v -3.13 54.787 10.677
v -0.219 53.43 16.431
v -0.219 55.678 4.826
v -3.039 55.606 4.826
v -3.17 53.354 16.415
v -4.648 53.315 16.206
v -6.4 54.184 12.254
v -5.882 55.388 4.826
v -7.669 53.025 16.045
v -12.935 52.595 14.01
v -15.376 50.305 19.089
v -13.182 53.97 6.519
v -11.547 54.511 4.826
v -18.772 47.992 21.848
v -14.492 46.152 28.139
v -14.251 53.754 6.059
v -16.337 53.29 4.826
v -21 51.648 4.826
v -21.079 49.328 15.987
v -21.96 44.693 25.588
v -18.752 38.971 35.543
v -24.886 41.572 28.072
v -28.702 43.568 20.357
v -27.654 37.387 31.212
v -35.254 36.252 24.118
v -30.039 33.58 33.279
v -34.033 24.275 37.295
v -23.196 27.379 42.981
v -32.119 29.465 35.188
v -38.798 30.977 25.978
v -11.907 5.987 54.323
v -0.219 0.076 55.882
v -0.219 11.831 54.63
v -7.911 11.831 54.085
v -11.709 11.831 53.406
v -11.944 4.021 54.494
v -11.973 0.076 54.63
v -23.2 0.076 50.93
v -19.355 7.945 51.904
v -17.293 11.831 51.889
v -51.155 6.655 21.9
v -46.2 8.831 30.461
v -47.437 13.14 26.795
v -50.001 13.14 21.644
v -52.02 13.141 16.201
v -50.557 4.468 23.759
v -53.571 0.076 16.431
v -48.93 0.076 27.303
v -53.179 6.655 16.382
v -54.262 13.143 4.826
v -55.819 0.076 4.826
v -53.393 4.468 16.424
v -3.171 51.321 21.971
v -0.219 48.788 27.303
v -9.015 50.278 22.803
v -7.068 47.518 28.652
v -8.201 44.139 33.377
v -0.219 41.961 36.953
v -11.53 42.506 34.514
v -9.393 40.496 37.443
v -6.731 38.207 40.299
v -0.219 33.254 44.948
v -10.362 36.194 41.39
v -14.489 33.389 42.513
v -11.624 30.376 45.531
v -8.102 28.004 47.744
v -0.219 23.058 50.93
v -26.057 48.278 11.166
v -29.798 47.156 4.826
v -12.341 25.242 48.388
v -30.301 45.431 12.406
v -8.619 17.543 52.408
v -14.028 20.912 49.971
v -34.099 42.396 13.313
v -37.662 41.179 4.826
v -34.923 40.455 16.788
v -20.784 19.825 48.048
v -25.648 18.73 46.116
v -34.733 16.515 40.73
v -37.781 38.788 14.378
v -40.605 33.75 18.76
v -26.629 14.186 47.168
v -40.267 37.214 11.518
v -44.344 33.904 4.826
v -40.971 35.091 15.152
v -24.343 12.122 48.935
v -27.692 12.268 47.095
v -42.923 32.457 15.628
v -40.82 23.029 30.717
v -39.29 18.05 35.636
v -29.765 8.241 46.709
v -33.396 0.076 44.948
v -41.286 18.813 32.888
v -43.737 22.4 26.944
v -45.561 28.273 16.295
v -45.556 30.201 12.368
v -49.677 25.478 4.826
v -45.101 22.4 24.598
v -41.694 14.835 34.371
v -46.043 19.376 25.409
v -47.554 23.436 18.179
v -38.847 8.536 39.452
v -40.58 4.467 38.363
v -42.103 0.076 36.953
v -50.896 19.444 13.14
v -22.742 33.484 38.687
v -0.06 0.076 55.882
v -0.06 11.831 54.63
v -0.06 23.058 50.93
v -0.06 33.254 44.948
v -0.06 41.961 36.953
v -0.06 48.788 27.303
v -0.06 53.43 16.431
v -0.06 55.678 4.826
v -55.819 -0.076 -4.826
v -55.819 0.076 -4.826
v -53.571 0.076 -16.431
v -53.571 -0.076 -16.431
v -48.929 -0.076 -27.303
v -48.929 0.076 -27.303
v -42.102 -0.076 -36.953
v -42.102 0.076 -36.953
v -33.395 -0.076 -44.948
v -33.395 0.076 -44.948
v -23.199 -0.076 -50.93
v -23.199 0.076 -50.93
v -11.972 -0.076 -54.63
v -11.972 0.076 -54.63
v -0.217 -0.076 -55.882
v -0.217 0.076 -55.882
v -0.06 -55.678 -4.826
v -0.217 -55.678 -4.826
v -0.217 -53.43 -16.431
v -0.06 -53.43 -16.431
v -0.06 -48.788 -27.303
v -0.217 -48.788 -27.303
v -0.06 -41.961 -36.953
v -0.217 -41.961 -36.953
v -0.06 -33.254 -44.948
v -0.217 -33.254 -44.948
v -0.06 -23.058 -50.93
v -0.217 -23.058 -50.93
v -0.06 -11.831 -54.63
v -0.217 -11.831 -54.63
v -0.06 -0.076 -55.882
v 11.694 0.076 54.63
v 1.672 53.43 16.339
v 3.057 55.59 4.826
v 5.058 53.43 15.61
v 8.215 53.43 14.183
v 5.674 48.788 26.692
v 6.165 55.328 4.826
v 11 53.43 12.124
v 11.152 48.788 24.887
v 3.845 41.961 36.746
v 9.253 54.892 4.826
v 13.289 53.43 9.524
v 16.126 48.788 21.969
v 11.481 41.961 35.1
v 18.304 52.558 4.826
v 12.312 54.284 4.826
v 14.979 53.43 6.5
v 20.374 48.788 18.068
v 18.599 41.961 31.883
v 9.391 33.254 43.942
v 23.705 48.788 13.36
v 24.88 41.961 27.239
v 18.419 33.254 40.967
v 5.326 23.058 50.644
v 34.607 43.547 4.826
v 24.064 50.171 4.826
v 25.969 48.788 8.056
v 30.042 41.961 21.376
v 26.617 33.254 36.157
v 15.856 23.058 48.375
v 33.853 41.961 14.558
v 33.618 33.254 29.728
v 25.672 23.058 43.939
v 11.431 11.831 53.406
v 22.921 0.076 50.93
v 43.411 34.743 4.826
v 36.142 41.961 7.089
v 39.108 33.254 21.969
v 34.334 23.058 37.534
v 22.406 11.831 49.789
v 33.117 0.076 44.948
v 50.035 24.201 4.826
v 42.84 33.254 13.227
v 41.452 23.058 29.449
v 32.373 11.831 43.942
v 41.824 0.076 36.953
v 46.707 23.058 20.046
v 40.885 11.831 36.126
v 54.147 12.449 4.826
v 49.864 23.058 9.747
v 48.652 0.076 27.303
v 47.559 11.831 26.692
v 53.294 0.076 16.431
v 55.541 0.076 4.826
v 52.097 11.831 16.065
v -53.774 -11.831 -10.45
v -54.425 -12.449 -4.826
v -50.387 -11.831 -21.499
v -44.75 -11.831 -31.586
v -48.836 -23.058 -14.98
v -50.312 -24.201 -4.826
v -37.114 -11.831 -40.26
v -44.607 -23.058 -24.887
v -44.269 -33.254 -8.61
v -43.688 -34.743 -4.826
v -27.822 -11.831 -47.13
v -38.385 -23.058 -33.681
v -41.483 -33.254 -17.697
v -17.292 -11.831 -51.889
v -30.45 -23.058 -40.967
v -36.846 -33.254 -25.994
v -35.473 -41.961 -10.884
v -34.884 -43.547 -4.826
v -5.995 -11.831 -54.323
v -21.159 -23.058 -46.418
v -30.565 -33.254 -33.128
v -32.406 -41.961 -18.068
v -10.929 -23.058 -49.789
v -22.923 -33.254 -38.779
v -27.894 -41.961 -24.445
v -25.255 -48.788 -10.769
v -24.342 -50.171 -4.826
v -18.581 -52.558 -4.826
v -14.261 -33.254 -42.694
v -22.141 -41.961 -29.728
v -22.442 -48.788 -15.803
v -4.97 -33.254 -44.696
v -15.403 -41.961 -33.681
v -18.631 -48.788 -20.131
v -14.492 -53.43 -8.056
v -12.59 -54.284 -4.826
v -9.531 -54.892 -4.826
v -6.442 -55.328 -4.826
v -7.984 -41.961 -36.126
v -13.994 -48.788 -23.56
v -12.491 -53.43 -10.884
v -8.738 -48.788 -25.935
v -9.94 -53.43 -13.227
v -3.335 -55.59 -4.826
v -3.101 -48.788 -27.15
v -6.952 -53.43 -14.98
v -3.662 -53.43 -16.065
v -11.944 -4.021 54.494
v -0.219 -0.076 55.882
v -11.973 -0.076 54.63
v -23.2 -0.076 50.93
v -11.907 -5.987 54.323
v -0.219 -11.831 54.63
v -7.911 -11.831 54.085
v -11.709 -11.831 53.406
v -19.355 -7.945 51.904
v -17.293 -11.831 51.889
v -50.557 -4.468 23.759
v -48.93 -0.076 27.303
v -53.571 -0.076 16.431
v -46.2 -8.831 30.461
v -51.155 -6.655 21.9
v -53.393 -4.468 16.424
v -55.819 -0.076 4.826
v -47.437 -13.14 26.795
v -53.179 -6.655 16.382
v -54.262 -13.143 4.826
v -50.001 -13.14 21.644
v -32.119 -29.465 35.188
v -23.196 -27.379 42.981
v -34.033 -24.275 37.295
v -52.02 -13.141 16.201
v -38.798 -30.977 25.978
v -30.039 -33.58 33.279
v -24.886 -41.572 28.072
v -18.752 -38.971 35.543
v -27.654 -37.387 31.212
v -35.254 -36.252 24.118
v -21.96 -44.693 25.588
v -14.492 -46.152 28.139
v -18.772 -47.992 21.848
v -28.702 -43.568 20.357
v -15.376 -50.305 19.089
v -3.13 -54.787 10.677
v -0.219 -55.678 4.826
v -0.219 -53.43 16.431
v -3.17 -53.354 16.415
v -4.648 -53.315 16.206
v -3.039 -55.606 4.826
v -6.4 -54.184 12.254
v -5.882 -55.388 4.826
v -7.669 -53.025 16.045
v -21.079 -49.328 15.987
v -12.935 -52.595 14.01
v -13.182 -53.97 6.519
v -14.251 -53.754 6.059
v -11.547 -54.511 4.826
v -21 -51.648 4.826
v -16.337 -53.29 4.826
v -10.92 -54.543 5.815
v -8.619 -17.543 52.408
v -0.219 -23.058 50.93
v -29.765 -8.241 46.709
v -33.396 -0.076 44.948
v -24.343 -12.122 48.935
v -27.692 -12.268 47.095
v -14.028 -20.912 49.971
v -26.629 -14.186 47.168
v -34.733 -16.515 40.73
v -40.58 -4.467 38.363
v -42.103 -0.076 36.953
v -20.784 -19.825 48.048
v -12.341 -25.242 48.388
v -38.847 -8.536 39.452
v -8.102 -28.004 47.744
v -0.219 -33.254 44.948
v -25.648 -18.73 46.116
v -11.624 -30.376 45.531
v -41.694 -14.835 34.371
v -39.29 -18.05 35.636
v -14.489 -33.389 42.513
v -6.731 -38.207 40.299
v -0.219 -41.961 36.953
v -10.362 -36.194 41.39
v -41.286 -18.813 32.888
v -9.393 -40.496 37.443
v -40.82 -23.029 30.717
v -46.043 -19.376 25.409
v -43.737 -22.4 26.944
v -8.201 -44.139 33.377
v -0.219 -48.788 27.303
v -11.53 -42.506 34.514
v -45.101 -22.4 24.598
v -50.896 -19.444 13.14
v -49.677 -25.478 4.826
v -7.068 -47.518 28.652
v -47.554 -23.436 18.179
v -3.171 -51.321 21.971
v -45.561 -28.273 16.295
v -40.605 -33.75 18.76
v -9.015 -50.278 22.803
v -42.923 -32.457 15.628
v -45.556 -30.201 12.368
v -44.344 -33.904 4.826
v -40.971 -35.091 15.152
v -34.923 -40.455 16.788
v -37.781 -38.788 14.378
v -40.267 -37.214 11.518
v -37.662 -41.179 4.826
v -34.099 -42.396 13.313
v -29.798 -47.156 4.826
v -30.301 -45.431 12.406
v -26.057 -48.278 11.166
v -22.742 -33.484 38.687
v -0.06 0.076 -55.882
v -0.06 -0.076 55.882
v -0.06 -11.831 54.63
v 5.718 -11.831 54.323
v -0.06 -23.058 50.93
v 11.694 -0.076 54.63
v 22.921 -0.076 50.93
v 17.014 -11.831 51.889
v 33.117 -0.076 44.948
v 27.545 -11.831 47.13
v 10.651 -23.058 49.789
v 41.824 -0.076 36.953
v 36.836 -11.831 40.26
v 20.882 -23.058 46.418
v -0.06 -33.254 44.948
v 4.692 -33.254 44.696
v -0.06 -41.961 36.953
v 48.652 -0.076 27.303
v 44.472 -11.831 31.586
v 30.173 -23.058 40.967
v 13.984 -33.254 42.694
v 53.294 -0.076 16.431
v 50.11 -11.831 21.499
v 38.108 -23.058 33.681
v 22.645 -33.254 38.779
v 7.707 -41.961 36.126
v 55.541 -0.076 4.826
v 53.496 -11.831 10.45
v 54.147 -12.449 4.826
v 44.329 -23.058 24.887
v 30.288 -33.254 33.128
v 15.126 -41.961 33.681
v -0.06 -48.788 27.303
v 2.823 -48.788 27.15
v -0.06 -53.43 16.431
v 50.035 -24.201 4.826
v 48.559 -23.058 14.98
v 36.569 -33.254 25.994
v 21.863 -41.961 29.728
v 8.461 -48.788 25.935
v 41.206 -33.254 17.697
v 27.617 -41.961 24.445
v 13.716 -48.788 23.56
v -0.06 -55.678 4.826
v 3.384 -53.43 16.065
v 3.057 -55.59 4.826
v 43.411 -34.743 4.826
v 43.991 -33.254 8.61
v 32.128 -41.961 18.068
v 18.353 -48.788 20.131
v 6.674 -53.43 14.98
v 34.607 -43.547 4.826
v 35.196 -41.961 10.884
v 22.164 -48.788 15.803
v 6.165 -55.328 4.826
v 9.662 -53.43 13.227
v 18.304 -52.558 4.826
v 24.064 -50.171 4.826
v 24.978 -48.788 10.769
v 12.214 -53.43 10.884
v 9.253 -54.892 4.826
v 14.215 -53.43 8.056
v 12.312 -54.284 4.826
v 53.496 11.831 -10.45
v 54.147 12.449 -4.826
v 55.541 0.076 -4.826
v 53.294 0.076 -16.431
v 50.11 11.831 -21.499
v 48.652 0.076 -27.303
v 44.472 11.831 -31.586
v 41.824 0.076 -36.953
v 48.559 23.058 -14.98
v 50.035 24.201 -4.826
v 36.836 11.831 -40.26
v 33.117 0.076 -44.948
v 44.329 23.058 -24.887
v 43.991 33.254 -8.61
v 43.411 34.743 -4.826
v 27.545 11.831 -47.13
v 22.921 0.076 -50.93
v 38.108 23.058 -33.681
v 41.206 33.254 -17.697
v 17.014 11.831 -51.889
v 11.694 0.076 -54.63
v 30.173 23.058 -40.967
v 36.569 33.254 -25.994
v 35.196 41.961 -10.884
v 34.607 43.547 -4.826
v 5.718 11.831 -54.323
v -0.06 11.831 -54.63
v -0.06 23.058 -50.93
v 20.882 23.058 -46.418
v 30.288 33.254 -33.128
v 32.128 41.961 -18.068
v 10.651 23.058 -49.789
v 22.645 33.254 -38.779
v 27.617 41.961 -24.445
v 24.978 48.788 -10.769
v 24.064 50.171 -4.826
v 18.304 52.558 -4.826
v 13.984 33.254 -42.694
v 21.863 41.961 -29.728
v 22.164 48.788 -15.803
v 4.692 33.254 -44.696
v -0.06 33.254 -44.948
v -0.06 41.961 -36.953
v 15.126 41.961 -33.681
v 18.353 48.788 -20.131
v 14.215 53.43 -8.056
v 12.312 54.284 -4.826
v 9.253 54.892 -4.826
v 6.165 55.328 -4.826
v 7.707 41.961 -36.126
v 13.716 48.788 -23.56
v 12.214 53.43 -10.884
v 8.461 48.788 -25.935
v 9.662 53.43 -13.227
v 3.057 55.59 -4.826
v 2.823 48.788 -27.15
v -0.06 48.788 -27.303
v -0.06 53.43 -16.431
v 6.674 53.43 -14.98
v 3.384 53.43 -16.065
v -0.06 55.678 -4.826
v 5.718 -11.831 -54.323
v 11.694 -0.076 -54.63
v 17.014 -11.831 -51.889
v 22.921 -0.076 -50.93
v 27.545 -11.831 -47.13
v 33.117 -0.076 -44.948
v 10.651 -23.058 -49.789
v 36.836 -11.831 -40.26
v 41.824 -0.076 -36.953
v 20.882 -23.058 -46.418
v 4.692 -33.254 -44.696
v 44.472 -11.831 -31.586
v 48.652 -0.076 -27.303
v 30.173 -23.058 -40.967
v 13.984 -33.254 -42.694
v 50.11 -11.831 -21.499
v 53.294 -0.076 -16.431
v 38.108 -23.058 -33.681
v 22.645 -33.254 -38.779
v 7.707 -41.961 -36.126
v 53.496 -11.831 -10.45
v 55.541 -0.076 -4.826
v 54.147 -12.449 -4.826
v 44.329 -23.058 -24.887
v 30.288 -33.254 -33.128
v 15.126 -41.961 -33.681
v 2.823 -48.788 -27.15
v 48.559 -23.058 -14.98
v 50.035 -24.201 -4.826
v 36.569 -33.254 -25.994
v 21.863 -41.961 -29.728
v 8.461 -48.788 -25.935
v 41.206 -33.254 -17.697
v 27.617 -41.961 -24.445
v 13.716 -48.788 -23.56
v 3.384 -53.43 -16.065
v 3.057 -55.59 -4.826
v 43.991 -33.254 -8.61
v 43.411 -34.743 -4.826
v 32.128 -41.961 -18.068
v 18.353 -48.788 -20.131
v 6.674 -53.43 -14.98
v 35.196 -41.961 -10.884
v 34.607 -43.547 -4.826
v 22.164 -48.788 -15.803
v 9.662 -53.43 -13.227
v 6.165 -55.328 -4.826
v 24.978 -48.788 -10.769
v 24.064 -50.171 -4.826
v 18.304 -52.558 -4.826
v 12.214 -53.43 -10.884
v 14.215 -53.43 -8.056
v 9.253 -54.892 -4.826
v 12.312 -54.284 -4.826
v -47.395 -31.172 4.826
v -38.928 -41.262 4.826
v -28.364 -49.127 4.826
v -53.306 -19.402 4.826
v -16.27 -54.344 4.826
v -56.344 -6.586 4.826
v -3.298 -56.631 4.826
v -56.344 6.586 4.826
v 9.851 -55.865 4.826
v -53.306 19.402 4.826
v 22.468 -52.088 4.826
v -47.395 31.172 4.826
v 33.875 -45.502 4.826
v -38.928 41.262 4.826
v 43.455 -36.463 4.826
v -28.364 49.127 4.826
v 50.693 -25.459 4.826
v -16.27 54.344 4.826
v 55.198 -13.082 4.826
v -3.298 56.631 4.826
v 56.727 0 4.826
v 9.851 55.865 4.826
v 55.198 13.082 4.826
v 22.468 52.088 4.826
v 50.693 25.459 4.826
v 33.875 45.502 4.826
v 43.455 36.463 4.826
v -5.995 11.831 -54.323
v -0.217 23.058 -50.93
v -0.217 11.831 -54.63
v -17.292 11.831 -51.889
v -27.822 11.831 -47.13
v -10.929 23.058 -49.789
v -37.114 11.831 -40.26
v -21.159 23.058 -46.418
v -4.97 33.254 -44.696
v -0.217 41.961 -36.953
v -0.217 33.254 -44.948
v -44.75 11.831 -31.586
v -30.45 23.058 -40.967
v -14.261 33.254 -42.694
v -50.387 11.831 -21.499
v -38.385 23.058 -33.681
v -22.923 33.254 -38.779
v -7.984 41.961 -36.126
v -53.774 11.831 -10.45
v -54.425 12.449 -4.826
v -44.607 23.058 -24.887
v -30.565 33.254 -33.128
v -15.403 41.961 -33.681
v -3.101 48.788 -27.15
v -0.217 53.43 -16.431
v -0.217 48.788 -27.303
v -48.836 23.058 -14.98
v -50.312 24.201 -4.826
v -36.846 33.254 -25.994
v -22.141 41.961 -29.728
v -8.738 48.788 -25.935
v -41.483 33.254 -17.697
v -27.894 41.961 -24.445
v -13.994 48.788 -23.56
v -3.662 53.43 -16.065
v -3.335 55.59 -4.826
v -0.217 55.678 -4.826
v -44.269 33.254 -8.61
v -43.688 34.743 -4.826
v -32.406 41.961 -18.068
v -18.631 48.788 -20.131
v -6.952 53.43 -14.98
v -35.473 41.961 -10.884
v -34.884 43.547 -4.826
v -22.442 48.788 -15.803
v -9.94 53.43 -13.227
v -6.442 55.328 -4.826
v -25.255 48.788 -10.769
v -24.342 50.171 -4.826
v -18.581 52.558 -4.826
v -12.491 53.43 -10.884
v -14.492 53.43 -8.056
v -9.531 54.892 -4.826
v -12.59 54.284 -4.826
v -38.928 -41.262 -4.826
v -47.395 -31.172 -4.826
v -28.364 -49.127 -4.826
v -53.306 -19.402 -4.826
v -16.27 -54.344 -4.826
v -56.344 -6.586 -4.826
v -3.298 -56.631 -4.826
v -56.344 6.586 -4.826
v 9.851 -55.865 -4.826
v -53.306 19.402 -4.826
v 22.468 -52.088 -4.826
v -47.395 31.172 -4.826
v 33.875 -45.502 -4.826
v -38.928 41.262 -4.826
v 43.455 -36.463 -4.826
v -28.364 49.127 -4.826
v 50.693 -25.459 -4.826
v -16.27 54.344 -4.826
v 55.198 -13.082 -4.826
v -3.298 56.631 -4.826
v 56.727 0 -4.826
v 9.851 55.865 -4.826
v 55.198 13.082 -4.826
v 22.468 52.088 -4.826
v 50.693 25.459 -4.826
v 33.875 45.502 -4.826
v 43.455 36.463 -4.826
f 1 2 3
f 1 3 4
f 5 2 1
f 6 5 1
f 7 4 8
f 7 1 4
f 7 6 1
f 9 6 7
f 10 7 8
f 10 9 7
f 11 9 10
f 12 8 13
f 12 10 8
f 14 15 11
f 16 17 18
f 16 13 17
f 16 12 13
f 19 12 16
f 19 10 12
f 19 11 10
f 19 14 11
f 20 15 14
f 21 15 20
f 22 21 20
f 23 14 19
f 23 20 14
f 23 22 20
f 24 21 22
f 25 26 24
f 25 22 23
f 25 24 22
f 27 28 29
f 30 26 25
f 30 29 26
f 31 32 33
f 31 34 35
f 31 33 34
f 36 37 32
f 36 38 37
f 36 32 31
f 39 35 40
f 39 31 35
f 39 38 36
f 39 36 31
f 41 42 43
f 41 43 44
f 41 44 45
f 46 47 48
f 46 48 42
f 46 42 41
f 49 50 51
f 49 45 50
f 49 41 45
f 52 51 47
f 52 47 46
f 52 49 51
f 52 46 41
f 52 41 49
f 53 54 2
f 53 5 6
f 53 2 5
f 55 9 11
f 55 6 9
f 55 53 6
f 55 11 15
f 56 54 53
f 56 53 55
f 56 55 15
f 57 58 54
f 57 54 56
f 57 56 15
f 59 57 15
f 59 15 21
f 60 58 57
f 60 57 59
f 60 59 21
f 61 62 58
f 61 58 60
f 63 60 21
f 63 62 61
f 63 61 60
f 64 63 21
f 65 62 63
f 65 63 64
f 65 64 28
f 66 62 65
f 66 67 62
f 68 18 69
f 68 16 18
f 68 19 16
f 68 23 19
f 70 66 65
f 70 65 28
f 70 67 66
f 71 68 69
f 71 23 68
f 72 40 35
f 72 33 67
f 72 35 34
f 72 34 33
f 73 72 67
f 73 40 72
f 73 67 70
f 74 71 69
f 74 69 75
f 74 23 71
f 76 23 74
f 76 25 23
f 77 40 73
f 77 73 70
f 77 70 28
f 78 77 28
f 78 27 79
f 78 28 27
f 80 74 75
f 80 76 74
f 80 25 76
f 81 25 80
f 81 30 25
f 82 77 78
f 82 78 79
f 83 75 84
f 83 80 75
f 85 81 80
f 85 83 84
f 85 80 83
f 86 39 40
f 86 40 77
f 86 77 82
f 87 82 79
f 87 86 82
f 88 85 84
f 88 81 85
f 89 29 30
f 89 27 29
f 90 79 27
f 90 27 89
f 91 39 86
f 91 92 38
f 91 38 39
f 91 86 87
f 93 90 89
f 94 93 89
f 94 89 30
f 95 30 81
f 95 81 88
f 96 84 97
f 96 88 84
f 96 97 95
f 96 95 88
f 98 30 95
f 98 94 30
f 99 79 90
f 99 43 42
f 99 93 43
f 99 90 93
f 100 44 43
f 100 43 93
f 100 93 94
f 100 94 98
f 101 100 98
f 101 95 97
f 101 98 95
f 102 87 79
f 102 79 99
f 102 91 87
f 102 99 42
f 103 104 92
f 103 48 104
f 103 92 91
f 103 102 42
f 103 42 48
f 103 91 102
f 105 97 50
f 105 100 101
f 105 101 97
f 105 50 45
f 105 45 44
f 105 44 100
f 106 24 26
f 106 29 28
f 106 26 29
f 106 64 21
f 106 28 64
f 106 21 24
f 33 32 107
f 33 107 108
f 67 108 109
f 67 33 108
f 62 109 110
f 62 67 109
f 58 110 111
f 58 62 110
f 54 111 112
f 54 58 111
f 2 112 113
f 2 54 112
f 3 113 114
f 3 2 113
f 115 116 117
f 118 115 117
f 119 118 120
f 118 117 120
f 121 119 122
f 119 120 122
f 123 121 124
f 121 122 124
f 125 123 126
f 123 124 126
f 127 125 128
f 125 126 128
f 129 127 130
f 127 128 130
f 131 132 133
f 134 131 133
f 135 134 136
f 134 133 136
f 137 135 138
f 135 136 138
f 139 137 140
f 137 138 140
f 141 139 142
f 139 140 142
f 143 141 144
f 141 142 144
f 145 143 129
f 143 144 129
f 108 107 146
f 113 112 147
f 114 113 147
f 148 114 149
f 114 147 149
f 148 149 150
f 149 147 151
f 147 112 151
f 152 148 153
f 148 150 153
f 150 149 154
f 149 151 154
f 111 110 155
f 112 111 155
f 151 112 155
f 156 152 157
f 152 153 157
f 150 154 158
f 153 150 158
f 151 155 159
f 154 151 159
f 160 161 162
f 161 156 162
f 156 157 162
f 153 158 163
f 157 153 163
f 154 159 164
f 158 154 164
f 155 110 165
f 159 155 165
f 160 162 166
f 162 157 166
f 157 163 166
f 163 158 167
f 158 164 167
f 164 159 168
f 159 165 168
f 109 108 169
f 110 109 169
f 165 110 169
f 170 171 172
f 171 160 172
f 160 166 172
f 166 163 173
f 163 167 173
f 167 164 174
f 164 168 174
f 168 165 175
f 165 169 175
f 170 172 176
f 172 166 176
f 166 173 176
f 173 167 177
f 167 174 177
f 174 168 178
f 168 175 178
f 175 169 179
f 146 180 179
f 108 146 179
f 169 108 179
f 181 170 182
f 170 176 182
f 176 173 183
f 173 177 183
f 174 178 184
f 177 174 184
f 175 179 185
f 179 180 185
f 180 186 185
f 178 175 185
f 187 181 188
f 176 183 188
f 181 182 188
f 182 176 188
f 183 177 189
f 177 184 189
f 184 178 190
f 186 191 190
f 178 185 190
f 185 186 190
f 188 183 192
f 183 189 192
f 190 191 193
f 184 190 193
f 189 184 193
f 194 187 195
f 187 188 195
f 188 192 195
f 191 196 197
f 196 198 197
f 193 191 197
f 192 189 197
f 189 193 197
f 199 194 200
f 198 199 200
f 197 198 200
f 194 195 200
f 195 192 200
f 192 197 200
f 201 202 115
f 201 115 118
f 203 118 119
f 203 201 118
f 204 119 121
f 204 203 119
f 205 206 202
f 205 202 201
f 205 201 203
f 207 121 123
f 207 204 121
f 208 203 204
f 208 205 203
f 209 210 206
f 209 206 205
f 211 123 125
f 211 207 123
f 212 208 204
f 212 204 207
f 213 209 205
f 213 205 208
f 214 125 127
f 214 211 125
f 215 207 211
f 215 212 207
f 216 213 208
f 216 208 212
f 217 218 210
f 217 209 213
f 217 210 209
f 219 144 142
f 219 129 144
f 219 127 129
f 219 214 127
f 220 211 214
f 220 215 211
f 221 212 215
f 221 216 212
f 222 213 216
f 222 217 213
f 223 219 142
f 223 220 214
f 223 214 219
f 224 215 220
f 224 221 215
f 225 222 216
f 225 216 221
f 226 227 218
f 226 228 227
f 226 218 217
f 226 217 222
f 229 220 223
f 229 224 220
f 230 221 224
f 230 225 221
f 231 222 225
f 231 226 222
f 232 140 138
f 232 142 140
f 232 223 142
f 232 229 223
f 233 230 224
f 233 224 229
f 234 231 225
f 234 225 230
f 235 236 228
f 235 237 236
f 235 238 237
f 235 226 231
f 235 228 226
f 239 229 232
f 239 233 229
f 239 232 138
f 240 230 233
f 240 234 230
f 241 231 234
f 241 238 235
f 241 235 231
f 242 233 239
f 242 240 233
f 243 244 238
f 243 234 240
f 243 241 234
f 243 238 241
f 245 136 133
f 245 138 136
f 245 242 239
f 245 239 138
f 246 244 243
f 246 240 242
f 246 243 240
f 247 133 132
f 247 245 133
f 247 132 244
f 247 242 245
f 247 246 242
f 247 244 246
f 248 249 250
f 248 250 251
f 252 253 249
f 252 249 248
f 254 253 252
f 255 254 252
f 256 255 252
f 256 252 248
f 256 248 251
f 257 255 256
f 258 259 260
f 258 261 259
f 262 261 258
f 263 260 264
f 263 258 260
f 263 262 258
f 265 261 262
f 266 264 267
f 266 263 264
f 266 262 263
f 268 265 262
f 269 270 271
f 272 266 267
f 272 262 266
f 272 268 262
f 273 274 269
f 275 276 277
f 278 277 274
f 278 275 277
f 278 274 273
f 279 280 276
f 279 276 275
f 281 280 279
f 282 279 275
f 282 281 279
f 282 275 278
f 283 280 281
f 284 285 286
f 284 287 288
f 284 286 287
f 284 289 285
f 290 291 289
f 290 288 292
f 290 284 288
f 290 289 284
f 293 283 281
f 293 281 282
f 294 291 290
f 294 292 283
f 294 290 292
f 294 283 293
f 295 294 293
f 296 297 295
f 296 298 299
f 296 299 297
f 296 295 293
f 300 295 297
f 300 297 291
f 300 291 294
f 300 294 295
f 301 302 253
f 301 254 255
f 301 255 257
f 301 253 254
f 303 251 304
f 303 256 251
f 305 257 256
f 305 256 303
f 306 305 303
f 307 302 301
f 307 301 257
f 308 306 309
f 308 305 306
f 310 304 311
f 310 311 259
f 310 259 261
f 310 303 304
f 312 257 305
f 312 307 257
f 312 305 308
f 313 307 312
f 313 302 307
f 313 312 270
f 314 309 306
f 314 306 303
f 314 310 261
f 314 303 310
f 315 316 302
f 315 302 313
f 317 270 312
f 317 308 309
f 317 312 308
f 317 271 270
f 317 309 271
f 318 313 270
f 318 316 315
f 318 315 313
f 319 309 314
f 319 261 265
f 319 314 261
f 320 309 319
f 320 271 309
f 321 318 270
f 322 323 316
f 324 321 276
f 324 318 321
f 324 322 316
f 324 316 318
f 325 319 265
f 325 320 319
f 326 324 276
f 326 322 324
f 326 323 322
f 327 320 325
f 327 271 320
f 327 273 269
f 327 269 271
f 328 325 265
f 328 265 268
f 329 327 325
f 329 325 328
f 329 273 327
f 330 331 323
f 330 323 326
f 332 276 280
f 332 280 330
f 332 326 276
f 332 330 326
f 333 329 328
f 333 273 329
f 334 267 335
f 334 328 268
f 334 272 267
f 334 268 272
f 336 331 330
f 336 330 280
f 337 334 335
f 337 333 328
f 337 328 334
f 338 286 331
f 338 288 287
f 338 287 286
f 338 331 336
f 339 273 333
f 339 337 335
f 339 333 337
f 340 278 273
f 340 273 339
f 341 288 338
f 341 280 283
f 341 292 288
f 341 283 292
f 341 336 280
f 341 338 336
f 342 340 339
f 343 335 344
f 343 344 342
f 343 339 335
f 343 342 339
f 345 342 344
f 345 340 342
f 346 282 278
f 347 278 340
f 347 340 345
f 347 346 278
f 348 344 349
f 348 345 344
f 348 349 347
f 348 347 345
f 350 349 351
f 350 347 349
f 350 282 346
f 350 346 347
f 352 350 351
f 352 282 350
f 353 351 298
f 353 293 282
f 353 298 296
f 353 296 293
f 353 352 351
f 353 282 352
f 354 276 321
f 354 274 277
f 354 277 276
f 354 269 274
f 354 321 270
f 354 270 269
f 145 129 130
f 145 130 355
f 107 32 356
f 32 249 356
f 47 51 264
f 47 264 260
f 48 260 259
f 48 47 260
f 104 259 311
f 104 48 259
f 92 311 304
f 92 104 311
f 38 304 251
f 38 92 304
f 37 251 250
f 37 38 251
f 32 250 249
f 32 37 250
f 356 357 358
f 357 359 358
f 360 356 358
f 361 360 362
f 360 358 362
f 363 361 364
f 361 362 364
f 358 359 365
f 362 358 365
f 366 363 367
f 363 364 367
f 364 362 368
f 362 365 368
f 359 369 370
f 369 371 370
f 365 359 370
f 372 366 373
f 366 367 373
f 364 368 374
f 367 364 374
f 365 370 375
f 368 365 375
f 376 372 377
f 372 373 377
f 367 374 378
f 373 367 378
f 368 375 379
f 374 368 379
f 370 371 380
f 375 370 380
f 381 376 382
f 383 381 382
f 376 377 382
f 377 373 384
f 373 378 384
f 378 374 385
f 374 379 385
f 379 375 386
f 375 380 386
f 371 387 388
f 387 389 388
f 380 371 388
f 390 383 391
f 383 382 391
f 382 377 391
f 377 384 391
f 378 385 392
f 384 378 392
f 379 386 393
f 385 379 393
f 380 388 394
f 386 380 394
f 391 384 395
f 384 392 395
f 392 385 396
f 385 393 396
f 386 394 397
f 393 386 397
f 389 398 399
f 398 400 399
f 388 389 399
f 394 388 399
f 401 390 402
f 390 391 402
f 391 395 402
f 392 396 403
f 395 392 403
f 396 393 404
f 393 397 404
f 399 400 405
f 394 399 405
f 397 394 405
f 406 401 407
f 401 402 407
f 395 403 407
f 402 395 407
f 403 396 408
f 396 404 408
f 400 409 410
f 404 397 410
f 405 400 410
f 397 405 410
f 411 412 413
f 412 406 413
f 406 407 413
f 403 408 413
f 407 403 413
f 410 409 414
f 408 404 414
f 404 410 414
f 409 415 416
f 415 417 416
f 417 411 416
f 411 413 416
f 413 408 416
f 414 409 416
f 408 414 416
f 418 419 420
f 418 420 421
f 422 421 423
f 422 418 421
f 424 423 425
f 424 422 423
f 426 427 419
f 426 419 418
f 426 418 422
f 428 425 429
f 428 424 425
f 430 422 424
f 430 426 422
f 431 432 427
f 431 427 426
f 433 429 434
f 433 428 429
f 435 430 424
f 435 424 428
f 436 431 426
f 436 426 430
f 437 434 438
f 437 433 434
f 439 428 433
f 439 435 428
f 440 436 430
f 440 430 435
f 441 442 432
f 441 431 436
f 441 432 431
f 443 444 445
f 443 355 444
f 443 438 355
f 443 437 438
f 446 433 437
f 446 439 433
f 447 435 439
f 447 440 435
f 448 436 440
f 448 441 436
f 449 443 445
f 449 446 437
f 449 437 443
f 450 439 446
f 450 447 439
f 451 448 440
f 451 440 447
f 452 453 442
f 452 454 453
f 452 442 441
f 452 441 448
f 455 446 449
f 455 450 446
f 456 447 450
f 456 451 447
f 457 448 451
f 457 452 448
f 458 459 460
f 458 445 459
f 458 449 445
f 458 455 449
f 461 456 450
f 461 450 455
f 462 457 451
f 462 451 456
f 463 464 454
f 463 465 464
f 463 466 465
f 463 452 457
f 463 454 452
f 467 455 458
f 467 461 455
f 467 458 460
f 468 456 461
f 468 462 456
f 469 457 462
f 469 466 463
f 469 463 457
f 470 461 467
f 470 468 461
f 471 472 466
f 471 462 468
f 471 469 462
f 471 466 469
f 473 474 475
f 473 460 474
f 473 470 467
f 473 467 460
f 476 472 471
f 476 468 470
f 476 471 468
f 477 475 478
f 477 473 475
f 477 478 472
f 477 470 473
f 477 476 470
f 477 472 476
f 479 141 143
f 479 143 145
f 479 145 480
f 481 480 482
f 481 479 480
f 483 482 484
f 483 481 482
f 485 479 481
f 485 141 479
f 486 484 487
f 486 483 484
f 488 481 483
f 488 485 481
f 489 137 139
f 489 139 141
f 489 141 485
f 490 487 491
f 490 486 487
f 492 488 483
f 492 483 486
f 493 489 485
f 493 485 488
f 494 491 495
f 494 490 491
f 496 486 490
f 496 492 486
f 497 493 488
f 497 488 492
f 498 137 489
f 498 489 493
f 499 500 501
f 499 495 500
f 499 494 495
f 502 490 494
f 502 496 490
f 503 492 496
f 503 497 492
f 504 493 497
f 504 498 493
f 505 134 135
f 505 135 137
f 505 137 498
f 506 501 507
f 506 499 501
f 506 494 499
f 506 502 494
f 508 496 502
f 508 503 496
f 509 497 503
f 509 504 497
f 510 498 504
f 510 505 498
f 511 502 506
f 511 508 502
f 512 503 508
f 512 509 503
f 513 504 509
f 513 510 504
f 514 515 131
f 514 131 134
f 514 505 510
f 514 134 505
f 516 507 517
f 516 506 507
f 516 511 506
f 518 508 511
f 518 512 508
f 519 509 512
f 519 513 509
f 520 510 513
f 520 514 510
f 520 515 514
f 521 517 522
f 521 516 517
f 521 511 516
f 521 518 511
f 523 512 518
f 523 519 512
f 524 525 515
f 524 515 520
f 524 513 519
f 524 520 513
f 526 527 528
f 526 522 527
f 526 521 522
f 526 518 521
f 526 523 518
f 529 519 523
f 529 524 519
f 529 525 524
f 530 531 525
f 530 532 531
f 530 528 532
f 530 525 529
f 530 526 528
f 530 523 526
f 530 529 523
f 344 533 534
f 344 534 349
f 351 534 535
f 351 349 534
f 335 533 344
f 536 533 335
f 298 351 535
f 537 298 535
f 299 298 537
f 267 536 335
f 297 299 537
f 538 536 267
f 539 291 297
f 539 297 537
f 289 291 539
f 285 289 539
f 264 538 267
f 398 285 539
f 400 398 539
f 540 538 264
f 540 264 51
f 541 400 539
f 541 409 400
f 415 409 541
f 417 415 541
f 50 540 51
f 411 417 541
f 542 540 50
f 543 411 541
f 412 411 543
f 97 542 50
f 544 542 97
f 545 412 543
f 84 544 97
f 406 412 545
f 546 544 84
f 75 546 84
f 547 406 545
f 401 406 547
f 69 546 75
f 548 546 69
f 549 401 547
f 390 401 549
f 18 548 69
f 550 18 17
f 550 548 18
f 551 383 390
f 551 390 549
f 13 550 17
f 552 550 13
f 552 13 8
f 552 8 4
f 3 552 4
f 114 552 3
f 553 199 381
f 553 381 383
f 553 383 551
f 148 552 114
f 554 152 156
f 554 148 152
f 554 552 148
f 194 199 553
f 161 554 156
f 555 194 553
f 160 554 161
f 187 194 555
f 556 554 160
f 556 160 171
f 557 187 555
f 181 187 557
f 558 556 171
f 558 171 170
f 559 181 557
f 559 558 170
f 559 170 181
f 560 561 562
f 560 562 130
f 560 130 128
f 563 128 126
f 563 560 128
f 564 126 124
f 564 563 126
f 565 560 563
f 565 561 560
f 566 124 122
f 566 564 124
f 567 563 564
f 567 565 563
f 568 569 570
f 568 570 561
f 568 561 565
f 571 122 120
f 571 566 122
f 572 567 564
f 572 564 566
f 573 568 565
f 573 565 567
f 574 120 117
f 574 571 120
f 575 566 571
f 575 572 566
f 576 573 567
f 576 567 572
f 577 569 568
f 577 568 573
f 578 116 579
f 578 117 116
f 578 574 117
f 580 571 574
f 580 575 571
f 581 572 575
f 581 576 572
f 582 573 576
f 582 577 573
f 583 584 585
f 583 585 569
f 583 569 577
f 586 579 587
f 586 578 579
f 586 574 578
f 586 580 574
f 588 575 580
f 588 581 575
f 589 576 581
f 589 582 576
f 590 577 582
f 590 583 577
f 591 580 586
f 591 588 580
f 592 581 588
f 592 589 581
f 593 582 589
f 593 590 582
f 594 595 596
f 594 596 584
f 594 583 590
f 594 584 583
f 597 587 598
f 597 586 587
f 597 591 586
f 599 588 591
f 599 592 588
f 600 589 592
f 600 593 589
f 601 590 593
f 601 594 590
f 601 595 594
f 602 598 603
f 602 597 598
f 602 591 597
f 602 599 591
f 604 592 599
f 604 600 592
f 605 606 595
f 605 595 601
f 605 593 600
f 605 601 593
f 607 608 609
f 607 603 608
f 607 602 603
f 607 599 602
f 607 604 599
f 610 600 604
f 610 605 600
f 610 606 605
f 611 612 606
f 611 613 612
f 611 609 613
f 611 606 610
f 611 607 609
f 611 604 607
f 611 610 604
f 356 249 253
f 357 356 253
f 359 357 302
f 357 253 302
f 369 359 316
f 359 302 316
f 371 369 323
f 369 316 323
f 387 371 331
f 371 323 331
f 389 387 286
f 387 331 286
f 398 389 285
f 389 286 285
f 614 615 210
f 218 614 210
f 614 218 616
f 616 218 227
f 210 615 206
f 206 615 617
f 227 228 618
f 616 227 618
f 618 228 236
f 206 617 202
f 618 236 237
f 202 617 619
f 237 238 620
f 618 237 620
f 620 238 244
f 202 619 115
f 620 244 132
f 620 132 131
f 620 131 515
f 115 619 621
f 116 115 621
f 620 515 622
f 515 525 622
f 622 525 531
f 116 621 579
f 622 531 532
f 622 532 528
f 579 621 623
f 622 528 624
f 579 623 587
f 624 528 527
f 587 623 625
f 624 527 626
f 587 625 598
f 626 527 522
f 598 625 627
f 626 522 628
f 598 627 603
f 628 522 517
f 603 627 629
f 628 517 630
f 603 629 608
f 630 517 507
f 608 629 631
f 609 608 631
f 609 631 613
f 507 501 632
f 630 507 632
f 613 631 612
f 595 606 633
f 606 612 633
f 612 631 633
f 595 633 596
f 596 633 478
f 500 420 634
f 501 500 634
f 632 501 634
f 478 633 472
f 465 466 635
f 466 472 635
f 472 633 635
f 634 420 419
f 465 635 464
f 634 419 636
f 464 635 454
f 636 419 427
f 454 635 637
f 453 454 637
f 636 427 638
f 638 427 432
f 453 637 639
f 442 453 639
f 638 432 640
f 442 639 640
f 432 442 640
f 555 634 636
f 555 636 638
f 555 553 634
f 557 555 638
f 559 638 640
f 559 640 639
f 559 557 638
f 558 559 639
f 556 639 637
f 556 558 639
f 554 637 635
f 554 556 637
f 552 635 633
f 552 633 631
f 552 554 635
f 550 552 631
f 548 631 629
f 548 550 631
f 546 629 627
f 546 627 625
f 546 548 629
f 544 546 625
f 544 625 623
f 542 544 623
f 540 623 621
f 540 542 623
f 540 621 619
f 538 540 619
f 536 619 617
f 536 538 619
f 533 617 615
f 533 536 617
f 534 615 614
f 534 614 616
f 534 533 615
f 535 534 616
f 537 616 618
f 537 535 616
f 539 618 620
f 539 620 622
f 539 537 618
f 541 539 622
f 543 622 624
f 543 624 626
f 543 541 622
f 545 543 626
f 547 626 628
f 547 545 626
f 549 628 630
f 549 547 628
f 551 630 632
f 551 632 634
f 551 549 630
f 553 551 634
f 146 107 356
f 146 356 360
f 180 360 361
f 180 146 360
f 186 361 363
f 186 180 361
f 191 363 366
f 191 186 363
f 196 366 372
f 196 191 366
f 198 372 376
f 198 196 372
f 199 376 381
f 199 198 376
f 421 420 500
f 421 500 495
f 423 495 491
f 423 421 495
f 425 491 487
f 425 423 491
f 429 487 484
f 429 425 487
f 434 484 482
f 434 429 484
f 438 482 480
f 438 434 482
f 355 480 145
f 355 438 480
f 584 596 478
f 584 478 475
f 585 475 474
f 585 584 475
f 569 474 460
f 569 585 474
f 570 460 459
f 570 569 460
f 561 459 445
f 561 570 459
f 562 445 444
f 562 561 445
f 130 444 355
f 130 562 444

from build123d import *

# Parameters (mm, degrees)
F0_W         = 111.7644011974
F0_H         = 111.7644011974
F1_DEPTH     = 55.88
F2_R         = 55.8021322807
F3_R         = 55.8038
F5_T1_DEPTH  = 139.6679689167
F5_T3_DEPTH  = 0.1568011974
F5_T5_DEPTH  = 0.1524
F5_T7_DEPTH  = 139.6679689167
F5_T9_DEPTH  = 0.1568011974
F5_S13_W     = 56.919876
F5_S13_H     = 56.919876
F5_T14_DEPTH = 56.919876
F5_S19_W     = 56.919876
F5_S19_H     = 56.919876
F5_T20_DEPTH = 56.919876
F5_S25_W     = 56.919876
F5_S25_H     = 56.919876
F5_T26_DEPTH = 56.919876
F5_S31_W     = 56.919876
F5_S31_H     = 56.919876
F5_T32_DEPTH = 56.919876
F5_T36_ANGLE = 90
F5_T38_ANGLE = 90
F5_T40_ANGLE = 90
F5_T42_ANGLE = 90
F6_R         = 56.7270748454
F7_DEPTH     = 4.826


# Not quite as in the source:
# - a fillet or chamfer that OpenCascade refuses, or shapes differently, is made with other operations: its cross-section is extruded or revolved along the edge and cut away or added
# - a feature of the source that left no trace in its solid (it failed there, or was rolled back) is left out


with BuildPart() as f1:
    # F0 (on Front) → F1 (new body, symmetric)
    with BuildSketch(Plane.XZ):
        with Locations((-0.1386664808, 0)):
            Rectangle(F0_W, F0_H)
    extrude(amount=F1_DEPTH, both=True)

    # F2
    f2_edges = [f1.edges().sort_by_distance(p)[0] for p in [
        (-56.020867, 0, 55.882201),
    ]]
    fillet(f2_edges, radius=F2_R)

    # F3
    f3_edges = [f1.edges().sort_by_distance(p)[0] for p in [
        (55.743534, 0, 55.882201),
    ]]
    fillet(f3_edges, radius=F3_R)

    # F5: fillet of radius 55.8038 on 10 edges, made by hand

    # F5_s2 → F5_t1 (cut)
    with BuildSketch(Plane.YZ.offset(-139.7282347988)):
        with BuildLine():
            ThreePointArc((0.0762, 55.8822005987), (39.535445396, 39.5376459947), (55.88, 0.0784005987))
            Line((55.88, 0.0784005987), (56.996076, 0.0784005987))
            Line((56.996076, 0.0784005987), (56.996076, 56.9982765987))
            Line((56.996076, 56.9982765987), (0.0762, 56.9982765987))
            Line((0.0762, 56.9982765987), (0.0762, 55.8822005987))
        make_face()
        with BuildLine():
            ThreePointArc((-0.0762, 55.8822005987), (-39.535445396, 39.5376459947), (-55.88, 0.0784005987))
            Line((-55.88, 0.0784005987), (-56.996076, 0.0784005987))
            Line((-56.996076, 0.0784005987), (-56.996076, 56.9982765987))
            Line((-56.996076, 56.9982765987), (-0.0762, 56.9982765987))
            Line((-0.0762, 56.9982765987), (-0.0762, 55.8822005987))
        make_face()
    extrude(amount=F5_T1_DEPTH, mode=Mode.SUBTRACT)

    # F5_s4 → F5_t3 (cut)
    with BuildSketch(Plane.YZ.offset(-0.2170670795)):
        with BuildLine():
            ThreePointArc((55.88, -0.0784005987), (39.535445396, -39.5376459947), (0.0762, -55.8822005987))
            Line((0.0762, -55.8822005987), (0.0762, -56.9982765987))
            Line((0.0762, -56.9982765987), (56.996076, -56.9982765987))
            Line((56.996076, -56.9982765987), (56.996076, -0.0784005987))
            Line((56.996076, -0.0784005987), (55.88, -0.0784005987))
        make_face()
        with BuildLine():
            ThreePointArc((-55.88, -0.0784005987), (-39.535445396, -39.5376459947), (-0.0762, -55.8822005987))
            Line((-0.0762, -55.8822005987), (-0.0762, -56.9982765987))
            Line((-0.0762, -56.9982765987), (-56.996076, -56.9982765987))
            Line((-56.996076, -56.9982765987), (-56.996076, -0.0784005987))
            Line((-56.996076, -0.0784005987), (-55.88, -0.0784005987))
        make_face()
    extrude(amount=F5_T3_DEPTH, mode=Mode.SUBTRACT)

    # F5_s6 → F5_t5 (cut)
    with BuildSketch(Plane.XZ.offset(-0.0762)):
        with BuildLine():
            ThreePointArc((55.7435341179, -0.0784005987), (39.3989795139, -39.5376459947), (-0.0602658821, -55.8822005987))
            Line((-0.0602658821, -55.8822005987), (-0.0602658821, -56.9982765987))
            Line((-0.0602658821, -56.9982765987), (56.8596101179, -56.9982765987))
            Line((56.8596101179, -56.9982765987), (56.8596101179, -0.0784005987))
            Line((56.8596101179, -0.0784005987), (55.7435341179, -0.0784005987))
        make_face()
        with BuildLine():
            ThreePointArc((-56.0208670795, -0.0784005987), (-39.6763124755, -39.5376459947), (-0.2170670795, -55.8822005987))
            Line((-0.2170670795, -55.8822005987), (-0.2170670795, -56.9982765987))
            Line((-0.2170670795, -56.9982765987), (-57.1369430795, -56.9982765987))
            Line((-57.1369430795, -56.9982765987), (-57.1369430795, -0.0784005987))
            Line((-57.1369430795, -0.0784005987), (-56.0208670795, -0.0784005987))
        make_face()
    extrude(amount=F5_T5_DEPTH, mode=Mode.SUBTRACT)

    # F5_s8 → F5_t7 (cut)
    with BuildSketch(Plane.XY.offset(-0.0784005987)):
        with BuildLine():
            ThreePointArc((-0.2170670795, -55.88), (-39.6763124755, -39.535445396), (-56.0208670795, -0.0762))
            Line((-56.0208670795, -0.0762), (-57.1369430795, -0.0762))
            Line((-57.1369430795, -0.0762), (-57.1369430795, -56.996076))
            Line((-57.1369430795, -56.996076), (-0.2170670795, -56.996076))
            Line((-0.2170670795, -56.996076), (-0.2170670795, -55.88))
        make_face()
        with BuildLine():
            ThreePointArc((-0.2170670795, 55.88), (-39.6763124755, 39.535445396), (-56.0208670795, 0.0762))
            Line((-56.0208670795, 0.0762), (-57.1369430795, 0.0762))
            Line((-57.1369430795, 0.0762), (-57.1369430795, 56.996076))
            Line((-57.1369430795, 56.996076), (-0.2170670795, 56.996076))
            Line((-0.2170670795, 56.996076), (-0.2170670795, 55.88))
        make_face()
    extrude(amount=F5_T7_DEPTH, mode=Mode.SUBTRACT)

    # F5_s10 → F5_t9 (cut)
    with BuildSketch(Plane.XY.offset(-0.0784005987)):
        with BuildLine():
            ThreePointArc((-0.0602658821, -55.88), (39.3989795139, -39.535445396), (55.7435341179, -0.0762))
            Line((55.7435341179, -0.0762), (56.8596101179, -0.0762))
            Line((56.8596101179, -0.0762), (56.8596101179, -56.996076))
            Line((56.8596101179, -56.996076), (-0.0602658821, -56.996076))
            Line((-0.0602658821, -56.996076), (-0.0602658821, -55.88))
        make_face()
        with BuildLine():
            ThreePointArc((-0.0602658821, 55.88), (39.3989795139, 39.535445396), (55.7435341179, 0.0762))
            Line((55.7435341179, 0.0762), (56.8596101179, 0.0762))
            Line((56.8596101179, 0.0762), (56.8596101179, 56.996076))
            Line((56.8596101179, 56.996076), (-0.0602658821, 56.996076))
            Line((-0.0602658821, 56.996076), (-0.0602658821, 55.88))
        make_face()
    extrude(amount=F5_T9_DEPTH, mode=Mode.SUBTRACT)


with BuildPart() as f5_tool12:
    # F5_s13 → F5_t14 (new body)
    with BuildSketch(Plane.XZ.offset(-0.0762)):
        with Locations((-28.6770050795, -28.5383385987)):
            Rectangle(F5_S13_W, F5_S13_H)
    extrude(amount=-F5_T14_DEPTH)

    # F5_s15 → F5_t16 (revolve, cut)
    with BuildSketch(Plane(origin=(-0.2170670795, 0.0762, -0.0784005987), x_dir=(0.7071067812, 0, 0.7071067812), z_dir=(-0.7071067812, 0, 0.7071067812))):
        with BuildLine():
            ThreePointArc((0, -55.8038), (55.8038, 0), (0, 55.8038))
            Line((0, 55.8038), (0, -55.8038))
        make_face()
    revolve(axis=Axis((-0.2170670795, 0.0762, -0.0784005987), (0, 1, 0)), mode=Mode.SUBTRACT)


with BuildPart() as f1_1:
    add(f1.part)

    # F5_t11: cut F5_tool12
    add(f5_tool12.part, mode=Mode.SUBTRACT)


with BuildPart() as f5_tool18:
    # F5_s19 → F5_t20 (new body)
    with BuildSketch(Plane.XZ.offset(-0.0762)):
        with Locations((28.3996721179, -28.5383385987)):
            Rectangle(F5_S19_W, F5_S19_H)
    extrude(amount=-F5_T20_DEPTH)

    # F5_s21 → F5_t22 (revolve, cut)
    with BuildSketch(Plane(origin=(-0.0602658821, 0.0762, -0.0784005987), x_dir=(-0.7071067812, 0, 0.7071067812), z_dir=(-0.7071067812, 0, -0.7071067812))):
        with BuildLine():
            ThreePointArc((0, -55.8038), (55.8038, 0), (0, 55.8038))
            Line((0, 55.8038), (0, -55.8038))
        make_face()
    revolve(axis=Axis((-0.0602658821, 0.0762, -0.0784005987), (0, 1, 0)), mode=Mode.SUBTRACT)


with BuildPart() as f1_2:
    add(f1_1.part)

    # F5_t17: cut F5_tool18
    add(f5_tool18.part, mode=Mode.SUBTRACT)


with BuildPart() as f5_tool24:
    # F5_s25 → F5_t26 (new body)
    with BuildSketch(Plane.XZ.offset(0.0762)):
        with Locations((-28.6770050795, -28.5383385987)):
            Rectangle(F5_S25_W, F5_S25_H)
    extrude(amount=F5_T26_DEPTH)

    # F5_s27 → F5_t28 (revolve, cut)
    with BuildSketch(Plane(origin=(-0.2170670795, -0.0762, -0.0784005987), x_dir=(0.7071067812, 0, 0.7071067812), z_dir=(0.7071067812, 0, -0.7071067812))):
        with BuildLine():
            ThreePointArc((0, -55.8038), (55.8038, 0), (0, 55.8038))
            Line((0, 55.8038), (0, -55.8038))
        make_face()
    revolve(axis=Axis((-0.2170670795, -0.0762, -0.0784005987), (0, -1, 0)), mode=Mode.SUBTRACT)


with BuildPart() as f1_3:
    add(f1_2.part)

    # F5_t23: cut F5_tool24
    add(f5_tool24.part, mode=Mode.SUBTRACT)


with BuildPart() as f5_tool30:
    # F5_s31 → F5_t32 (new body)
    with BuildSketch(Plane.XZ.offset(0.0762)):
        with Locations((28.3996721179, -28.5383385987)):
            Rectangle(F5_S31_W, F5_S31_H)
    extrude(amount=F5_T32_DEPTH)

    # F5_s33 → F5_t34 (revolve, cut)
    with BuildSketch(Plane(origin=(-0.0602658821, -0.0762, -0.0784005987), x_dir=(-0.7071067812, 0, 0.7071067812), z_dir=(0.7071067812, 0, 0.7071067812))):
        with BuildLine():
            ThreePointArc((0, -55.8038), (55.8038, 0), (0, 55.8038))
            Line((0, 55.8038), (0, -55.8038))
        make_face()
    revolve(axis=Axis((-0.0602658821, -0.0762, -0.0784005987), (0, -1, 0)), mode=Mode.SUBTRACT)


with BuildPart() as f1_4:
    add(f1_3.part)

    # F5_t29: cut F5_tool30
    add(f5_tool30.part, mode=Mode.SUBTRACT)

    # F5_s35 → F5_t36 (revolve, cut)
    with BuildSketch(Plane.YZ.offset(-0.0602658821)):
        with BuildLine():
            ThreePointArc((55.88, 0.0784005987), (39.535445396, 39.5376459947), (0.0762, 55.8822005987))
            Line((0.0762, 55.8822005987), (0.0762, 56.9982765987))
            Line((0.0762, 56.9982765987), (56.996076, 56.9982765987))
            Line((56.996076, 56.9982765987), (56.996076, 0.0784005987))
            Line((56.996076, 0.0784005987), (55.88, 0.0784005987))
        make_face()
    revolve(axis=Axis((-0.0602658821, 55.88, 0.0784005987), (0, 1, 0)), revolution_arc=F5_T36_ANGLE, mode=Mode.SUBTRACT)

    # F5_s37 → F5_t38 (revolve, cut)
    with BuildSketch(Plane.YZ.offset(-0.2187347988)):
        with BuildLine():
            ThreePointArc((55.8799999751, 0.080068318), (39.5348557638, 39.5382356181), (0.0762, 55.8822005987))
            Line((0.0762, 55.8822005987), (0.0762, 56.9982765987))
            Line((0.0762, 56.9982765987), (56.996076, 56.9982765987))
            Line((56.996076, 56.9982765987), (56.996076, 0.080068318))
            Line((56.996076, 0.080068318), (55.8799999751, 0.080068318))
        make_face()
    revolve(axis=Axis((-0.2187347988, 55.88, 0.080068318), (0, -1, 0)), revolution_arc=F5_T38_ANGLE, mode=Mode.SUBTRACT)

    # F5_s39 → F5_t40 (revolve, cut)
    with BuildSketch(Plane.YZ.offset(-0.0602658821)):
        with BuildLine():
            ThreePointArc((-0.0762, 55.8822005987), (-39.535445396, 39.5376459947), (-55.88, 0.0784005987))
            Line((-55.88, 0.0784005987), (-56.996076, 0.0784005987))
            Line((-56.996076, 0.0784005987), (-56.996076, 56.9982765987))
            Line((-56.996076, 56.9982765987), (-0.0762, 56.9982765987))
            Line((-0.0762, 56.9982765987), (-0.0762, 55.8822005987))
        make_face()
    revolve(axis=Axis((-0.0602658821, -55.88, 0.0784005987), (0, 1, 0)), revolution_arc=F5_T40_ANGLE, mode=Mode.SUBTRACT)

    # F5_s41 → F5_t42 (revolve, cut)
    with BuildSketch(Plane.YZ.offset(-0.2187347988)):
        with BuildLine():
            ThreePointArc((-0.0762, 55.8822005987), (-39.5348557638, 39.5382356181), (-55.8799999751, 0.080068318))
            Line((-55.8799999751, 0.080068318), (-56.996076, 0.080068318))
            Line((-56.996076, 0.080068318), (-56.996076, 56.9982765987))
            Line((-56.996076, 56.9982765987), (-0.0762, 56.9982765987))
            Line((-0.0762, 56.9982765987), (-0.0762, 55.8822005987))
        make_face()
    revolve(axis=Axis((-0.2187347988, -55.88, 0.080068318), (0, -1, 0)), revolution_arc=F5_T42_ANGLE, mode=Mode.SUBTRACT)

    # F6 (on Top) → F7 (join, symmetric)
    with BuildSketch(Plane.XY):
        Circle(F6_R)
    extrude(amount=F7_DEPTH, both=True)


solid = f1_4.part
